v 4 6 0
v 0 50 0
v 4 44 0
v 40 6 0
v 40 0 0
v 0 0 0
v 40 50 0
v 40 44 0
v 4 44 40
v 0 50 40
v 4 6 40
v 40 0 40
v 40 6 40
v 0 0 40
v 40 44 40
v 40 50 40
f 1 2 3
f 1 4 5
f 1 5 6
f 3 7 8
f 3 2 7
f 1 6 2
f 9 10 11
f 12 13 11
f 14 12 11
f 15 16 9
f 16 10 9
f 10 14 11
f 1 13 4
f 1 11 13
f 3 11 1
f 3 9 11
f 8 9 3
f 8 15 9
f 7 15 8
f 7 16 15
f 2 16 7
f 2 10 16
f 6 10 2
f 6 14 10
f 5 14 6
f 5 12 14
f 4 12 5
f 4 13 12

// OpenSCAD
$fn = 32;

// ----------------------------------------------------------------------
// Structural section: channel 40 x 50 mm
// ----------------------------------------------------------------------

// --- parameters (mm) ---
sec_w = 40;               // channel width, X
sec_h = 50;               // channel height, Y
flange_t = 6;             // flange thickness
web_t = 4;                // web thickness
plate_t = 40;             // cut length, Z (extrusion height)

profile = [[0, 0], [40, 0], [40, 6], [4, 6], [4, 44], [40, 44], [40, 50], [0, 50]];  // primary outline, 8 points, counter clockwise

// --- the one profile operation ---
linear_extrude(height = plate_t) polygon(points = profile);
